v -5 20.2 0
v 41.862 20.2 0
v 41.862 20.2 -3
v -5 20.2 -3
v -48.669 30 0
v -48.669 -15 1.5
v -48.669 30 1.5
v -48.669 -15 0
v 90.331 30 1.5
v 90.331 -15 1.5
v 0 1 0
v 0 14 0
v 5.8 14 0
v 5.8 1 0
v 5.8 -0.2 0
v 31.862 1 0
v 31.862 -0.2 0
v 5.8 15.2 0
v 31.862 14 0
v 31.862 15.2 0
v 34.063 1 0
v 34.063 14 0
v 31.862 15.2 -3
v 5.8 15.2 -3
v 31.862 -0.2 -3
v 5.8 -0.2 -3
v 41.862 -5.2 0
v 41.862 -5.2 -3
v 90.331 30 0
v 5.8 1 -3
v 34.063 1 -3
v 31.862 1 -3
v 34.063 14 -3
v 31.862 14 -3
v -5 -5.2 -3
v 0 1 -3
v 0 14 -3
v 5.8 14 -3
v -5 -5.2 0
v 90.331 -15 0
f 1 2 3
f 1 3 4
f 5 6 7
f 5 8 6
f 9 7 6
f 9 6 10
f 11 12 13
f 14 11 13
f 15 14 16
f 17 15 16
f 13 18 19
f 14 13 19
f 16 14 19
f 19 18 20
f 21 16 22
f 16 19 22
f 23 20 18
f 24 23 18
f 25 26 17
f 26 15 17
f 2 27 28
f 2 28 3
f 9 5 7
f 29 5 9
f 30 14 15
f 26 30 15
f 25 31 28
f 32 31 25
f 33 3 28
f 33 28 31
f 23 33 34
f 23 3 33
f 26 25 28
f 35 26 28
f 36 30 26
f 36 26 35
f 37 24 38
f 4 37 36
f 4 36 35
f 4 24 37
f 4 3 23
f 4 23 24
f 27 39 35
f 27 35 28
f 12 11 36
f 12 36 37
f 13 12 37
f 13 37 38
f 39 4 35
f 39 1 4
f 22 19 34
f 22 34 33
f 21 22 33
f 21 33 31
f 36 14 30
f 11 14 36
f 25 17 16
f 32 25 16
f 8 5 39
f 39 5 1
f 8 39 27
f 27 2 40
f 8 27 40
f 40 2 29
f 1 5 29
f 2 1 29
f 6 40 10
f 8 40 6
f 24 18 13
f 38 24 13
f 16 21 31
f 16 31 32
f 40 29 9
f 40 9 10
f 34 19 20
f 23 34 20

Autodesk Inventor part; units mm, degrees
ref_plane "YZ Plane" through (0, 0, 0) normal (1, 0, 0) x (0, 1, 0)
ref_plane "XZ Plane" through (0, 0, 0) normal (0, 1, 0) x (-1, 0, 0)
ref_plane "XY Plane" through (0, 0, 0) normal (0, 0, 1) x (1, 0, 0)
sketch "Sketch1" plane through (0, 0, 0) normal (0, 0, 1) x (1, 0, 0)
  line L0 (90.331, -15) -> (-48.669, -15)
  line L1 (-48.669, -15) -> (-48.669, 30)
  line L2 (-48.669, 30) -> (90.331, 30)
  line L3 (90.331, 30) -> (90.331, -15)
  line L4 (3.6008, 15) -> (3.6008, 14) projected
  line L5 (3.6008, 15) -> (38.0611, 15) projected
  line L6 (38.0611, 15) -> (38.0611, 14) projected
  line L7 (38.0611, 14) -> (3.6008, 14) projected
  arc A0 (1.6411, 15) -> (0, 14) centre (6, 6) ccw projected
  line L8 (0, 14) -> (34.0626, 14) projected
  line L9 (34.0626, 15) -> (34.0626, 14) projected
  line L10 (34.0626, 15) -> (1.6411, 15) projected
  line L11 (3.6008, 15) -> (-2.0587, 15) projected
  line L12 (-17.3084, 15) -> (-2.0587, 15) projected
  line L13 (38.0611, 0) -> (3.6008, 0) projected
  line L14 (-2.0587, 0) -> (3.6008, 0) projected
  line L15 (70.331, 14) -> (63.6008, 14) projected
  arc A1 (70.331, 1) -> (70.331, 14) centre (70.331, 7.5) ccw projected
  line L16 (63.6008, 1) -> (70.331, 1) projected
  line L17 (63.6008, 14) -> (63.6008, 1) projected
  line L18 (-21.9389, 14) -> (-28.669, 14) projected
  line L19 (-21.9389, 1) -> (-21.9389, 14) projected
  line L20 (-28.669, 1) -> (-21.9389, 1) projected
  arc A2 (-28.669, 14) -> (-28.669, 1) centre (-28.669, 7.5) ccw projected
  arc A3 (-28.669, 15) -> (-28.669, 0) centre (-28.669, 7.5) ccw projected
  arc A4 (70.331, 0) -> (70.331, 15) centre (70.331, 7.5) ccw projected
  point P0 (0, 0)
  point P1 (20.831, 30)
  dimension "d0" = 15
  dimension "d1" = 15
  dimension "d2" = 20
  dimension "d3" = 20
extrude "Extrusion1" add sketch "Sketch1" along normal blind 1.5 contours L0 L1 L2 L3 | L5 L9 L7 L4 | L4 L8 A0 L10 | L5 L6 L7 L9 | A1 L16 L17 L15 | L19 L20 A2 L18
sketch "Sketch2" plane through (0, 0, 0) normal (0, 0, -1) x (-1, 0, 0)
  line L0 (-6, 15) -> (-6, 0) projected
  line L1 (-31.6619, 15) -> (-6, 15) projected
  line L2 (-31.6619, 0) -> (-31.6619, 15) projected
  line L3 (-31.6619, 0) -> (-6, 0) projected
  line L4 (-90.331, 30) -> (48.669, 30) projected
  line L5 (-90.331, 30) -> (48.669, 30) projected
  line L6 (-90.331, -15) -> (-90.331, 30) projected
  line L7 (48.669, -15) -> (-90.331, -15) projected
  line L8 (48.669, 30) -> (48.669, -15) projected
  line L9 (-5.8, 15.2) -> (-5.8, -0.2)
  line L10 (-5.8, -0.2) -> (-31.8619, -0.2)
  line L11 (-31.8619, -0.2) -> (-31.8619, 15.2)
  line L12 (-31.8619, 15.2) -> (-5.8, 15.2)
  line L13 (-41.8619, 20.2) -> (5, 20.2)
  line L14 (5, 20.2) -> (5, -5.2)
  line L15 (5, -5.2) -> (-41.8619, -5.2)
  line L16 (-41.8619, -5.2) -> (-41.8619, 20.2)
  line L17 (-34.0626, 1) -> (0, 1) projected
  line L18 (-34.0626, 14) -> (-34.0626, 1) projected
  line L19 (0, 14) -> (-34.0626, 14) projected
  line L20 (0, 1) -> (0, 14) projected
  point P0 (0, 0)
  point P1 (-31.8619, 1)
  point P2 (-31.8619, 14)
  point P3 (-5.8, 14)
  point P4 (-5.8, 1)
  dimension "d6" = 0.2
  dimension "d7" = 5
  dimension "d8" = 10
  dimension "d9" = 5
  dimension "d10" = 5
extrude "Extrusion2" add sketch "Sketch2" along normal blind 3 contours L13 L14 L15 L16
properties part number "backplate"
